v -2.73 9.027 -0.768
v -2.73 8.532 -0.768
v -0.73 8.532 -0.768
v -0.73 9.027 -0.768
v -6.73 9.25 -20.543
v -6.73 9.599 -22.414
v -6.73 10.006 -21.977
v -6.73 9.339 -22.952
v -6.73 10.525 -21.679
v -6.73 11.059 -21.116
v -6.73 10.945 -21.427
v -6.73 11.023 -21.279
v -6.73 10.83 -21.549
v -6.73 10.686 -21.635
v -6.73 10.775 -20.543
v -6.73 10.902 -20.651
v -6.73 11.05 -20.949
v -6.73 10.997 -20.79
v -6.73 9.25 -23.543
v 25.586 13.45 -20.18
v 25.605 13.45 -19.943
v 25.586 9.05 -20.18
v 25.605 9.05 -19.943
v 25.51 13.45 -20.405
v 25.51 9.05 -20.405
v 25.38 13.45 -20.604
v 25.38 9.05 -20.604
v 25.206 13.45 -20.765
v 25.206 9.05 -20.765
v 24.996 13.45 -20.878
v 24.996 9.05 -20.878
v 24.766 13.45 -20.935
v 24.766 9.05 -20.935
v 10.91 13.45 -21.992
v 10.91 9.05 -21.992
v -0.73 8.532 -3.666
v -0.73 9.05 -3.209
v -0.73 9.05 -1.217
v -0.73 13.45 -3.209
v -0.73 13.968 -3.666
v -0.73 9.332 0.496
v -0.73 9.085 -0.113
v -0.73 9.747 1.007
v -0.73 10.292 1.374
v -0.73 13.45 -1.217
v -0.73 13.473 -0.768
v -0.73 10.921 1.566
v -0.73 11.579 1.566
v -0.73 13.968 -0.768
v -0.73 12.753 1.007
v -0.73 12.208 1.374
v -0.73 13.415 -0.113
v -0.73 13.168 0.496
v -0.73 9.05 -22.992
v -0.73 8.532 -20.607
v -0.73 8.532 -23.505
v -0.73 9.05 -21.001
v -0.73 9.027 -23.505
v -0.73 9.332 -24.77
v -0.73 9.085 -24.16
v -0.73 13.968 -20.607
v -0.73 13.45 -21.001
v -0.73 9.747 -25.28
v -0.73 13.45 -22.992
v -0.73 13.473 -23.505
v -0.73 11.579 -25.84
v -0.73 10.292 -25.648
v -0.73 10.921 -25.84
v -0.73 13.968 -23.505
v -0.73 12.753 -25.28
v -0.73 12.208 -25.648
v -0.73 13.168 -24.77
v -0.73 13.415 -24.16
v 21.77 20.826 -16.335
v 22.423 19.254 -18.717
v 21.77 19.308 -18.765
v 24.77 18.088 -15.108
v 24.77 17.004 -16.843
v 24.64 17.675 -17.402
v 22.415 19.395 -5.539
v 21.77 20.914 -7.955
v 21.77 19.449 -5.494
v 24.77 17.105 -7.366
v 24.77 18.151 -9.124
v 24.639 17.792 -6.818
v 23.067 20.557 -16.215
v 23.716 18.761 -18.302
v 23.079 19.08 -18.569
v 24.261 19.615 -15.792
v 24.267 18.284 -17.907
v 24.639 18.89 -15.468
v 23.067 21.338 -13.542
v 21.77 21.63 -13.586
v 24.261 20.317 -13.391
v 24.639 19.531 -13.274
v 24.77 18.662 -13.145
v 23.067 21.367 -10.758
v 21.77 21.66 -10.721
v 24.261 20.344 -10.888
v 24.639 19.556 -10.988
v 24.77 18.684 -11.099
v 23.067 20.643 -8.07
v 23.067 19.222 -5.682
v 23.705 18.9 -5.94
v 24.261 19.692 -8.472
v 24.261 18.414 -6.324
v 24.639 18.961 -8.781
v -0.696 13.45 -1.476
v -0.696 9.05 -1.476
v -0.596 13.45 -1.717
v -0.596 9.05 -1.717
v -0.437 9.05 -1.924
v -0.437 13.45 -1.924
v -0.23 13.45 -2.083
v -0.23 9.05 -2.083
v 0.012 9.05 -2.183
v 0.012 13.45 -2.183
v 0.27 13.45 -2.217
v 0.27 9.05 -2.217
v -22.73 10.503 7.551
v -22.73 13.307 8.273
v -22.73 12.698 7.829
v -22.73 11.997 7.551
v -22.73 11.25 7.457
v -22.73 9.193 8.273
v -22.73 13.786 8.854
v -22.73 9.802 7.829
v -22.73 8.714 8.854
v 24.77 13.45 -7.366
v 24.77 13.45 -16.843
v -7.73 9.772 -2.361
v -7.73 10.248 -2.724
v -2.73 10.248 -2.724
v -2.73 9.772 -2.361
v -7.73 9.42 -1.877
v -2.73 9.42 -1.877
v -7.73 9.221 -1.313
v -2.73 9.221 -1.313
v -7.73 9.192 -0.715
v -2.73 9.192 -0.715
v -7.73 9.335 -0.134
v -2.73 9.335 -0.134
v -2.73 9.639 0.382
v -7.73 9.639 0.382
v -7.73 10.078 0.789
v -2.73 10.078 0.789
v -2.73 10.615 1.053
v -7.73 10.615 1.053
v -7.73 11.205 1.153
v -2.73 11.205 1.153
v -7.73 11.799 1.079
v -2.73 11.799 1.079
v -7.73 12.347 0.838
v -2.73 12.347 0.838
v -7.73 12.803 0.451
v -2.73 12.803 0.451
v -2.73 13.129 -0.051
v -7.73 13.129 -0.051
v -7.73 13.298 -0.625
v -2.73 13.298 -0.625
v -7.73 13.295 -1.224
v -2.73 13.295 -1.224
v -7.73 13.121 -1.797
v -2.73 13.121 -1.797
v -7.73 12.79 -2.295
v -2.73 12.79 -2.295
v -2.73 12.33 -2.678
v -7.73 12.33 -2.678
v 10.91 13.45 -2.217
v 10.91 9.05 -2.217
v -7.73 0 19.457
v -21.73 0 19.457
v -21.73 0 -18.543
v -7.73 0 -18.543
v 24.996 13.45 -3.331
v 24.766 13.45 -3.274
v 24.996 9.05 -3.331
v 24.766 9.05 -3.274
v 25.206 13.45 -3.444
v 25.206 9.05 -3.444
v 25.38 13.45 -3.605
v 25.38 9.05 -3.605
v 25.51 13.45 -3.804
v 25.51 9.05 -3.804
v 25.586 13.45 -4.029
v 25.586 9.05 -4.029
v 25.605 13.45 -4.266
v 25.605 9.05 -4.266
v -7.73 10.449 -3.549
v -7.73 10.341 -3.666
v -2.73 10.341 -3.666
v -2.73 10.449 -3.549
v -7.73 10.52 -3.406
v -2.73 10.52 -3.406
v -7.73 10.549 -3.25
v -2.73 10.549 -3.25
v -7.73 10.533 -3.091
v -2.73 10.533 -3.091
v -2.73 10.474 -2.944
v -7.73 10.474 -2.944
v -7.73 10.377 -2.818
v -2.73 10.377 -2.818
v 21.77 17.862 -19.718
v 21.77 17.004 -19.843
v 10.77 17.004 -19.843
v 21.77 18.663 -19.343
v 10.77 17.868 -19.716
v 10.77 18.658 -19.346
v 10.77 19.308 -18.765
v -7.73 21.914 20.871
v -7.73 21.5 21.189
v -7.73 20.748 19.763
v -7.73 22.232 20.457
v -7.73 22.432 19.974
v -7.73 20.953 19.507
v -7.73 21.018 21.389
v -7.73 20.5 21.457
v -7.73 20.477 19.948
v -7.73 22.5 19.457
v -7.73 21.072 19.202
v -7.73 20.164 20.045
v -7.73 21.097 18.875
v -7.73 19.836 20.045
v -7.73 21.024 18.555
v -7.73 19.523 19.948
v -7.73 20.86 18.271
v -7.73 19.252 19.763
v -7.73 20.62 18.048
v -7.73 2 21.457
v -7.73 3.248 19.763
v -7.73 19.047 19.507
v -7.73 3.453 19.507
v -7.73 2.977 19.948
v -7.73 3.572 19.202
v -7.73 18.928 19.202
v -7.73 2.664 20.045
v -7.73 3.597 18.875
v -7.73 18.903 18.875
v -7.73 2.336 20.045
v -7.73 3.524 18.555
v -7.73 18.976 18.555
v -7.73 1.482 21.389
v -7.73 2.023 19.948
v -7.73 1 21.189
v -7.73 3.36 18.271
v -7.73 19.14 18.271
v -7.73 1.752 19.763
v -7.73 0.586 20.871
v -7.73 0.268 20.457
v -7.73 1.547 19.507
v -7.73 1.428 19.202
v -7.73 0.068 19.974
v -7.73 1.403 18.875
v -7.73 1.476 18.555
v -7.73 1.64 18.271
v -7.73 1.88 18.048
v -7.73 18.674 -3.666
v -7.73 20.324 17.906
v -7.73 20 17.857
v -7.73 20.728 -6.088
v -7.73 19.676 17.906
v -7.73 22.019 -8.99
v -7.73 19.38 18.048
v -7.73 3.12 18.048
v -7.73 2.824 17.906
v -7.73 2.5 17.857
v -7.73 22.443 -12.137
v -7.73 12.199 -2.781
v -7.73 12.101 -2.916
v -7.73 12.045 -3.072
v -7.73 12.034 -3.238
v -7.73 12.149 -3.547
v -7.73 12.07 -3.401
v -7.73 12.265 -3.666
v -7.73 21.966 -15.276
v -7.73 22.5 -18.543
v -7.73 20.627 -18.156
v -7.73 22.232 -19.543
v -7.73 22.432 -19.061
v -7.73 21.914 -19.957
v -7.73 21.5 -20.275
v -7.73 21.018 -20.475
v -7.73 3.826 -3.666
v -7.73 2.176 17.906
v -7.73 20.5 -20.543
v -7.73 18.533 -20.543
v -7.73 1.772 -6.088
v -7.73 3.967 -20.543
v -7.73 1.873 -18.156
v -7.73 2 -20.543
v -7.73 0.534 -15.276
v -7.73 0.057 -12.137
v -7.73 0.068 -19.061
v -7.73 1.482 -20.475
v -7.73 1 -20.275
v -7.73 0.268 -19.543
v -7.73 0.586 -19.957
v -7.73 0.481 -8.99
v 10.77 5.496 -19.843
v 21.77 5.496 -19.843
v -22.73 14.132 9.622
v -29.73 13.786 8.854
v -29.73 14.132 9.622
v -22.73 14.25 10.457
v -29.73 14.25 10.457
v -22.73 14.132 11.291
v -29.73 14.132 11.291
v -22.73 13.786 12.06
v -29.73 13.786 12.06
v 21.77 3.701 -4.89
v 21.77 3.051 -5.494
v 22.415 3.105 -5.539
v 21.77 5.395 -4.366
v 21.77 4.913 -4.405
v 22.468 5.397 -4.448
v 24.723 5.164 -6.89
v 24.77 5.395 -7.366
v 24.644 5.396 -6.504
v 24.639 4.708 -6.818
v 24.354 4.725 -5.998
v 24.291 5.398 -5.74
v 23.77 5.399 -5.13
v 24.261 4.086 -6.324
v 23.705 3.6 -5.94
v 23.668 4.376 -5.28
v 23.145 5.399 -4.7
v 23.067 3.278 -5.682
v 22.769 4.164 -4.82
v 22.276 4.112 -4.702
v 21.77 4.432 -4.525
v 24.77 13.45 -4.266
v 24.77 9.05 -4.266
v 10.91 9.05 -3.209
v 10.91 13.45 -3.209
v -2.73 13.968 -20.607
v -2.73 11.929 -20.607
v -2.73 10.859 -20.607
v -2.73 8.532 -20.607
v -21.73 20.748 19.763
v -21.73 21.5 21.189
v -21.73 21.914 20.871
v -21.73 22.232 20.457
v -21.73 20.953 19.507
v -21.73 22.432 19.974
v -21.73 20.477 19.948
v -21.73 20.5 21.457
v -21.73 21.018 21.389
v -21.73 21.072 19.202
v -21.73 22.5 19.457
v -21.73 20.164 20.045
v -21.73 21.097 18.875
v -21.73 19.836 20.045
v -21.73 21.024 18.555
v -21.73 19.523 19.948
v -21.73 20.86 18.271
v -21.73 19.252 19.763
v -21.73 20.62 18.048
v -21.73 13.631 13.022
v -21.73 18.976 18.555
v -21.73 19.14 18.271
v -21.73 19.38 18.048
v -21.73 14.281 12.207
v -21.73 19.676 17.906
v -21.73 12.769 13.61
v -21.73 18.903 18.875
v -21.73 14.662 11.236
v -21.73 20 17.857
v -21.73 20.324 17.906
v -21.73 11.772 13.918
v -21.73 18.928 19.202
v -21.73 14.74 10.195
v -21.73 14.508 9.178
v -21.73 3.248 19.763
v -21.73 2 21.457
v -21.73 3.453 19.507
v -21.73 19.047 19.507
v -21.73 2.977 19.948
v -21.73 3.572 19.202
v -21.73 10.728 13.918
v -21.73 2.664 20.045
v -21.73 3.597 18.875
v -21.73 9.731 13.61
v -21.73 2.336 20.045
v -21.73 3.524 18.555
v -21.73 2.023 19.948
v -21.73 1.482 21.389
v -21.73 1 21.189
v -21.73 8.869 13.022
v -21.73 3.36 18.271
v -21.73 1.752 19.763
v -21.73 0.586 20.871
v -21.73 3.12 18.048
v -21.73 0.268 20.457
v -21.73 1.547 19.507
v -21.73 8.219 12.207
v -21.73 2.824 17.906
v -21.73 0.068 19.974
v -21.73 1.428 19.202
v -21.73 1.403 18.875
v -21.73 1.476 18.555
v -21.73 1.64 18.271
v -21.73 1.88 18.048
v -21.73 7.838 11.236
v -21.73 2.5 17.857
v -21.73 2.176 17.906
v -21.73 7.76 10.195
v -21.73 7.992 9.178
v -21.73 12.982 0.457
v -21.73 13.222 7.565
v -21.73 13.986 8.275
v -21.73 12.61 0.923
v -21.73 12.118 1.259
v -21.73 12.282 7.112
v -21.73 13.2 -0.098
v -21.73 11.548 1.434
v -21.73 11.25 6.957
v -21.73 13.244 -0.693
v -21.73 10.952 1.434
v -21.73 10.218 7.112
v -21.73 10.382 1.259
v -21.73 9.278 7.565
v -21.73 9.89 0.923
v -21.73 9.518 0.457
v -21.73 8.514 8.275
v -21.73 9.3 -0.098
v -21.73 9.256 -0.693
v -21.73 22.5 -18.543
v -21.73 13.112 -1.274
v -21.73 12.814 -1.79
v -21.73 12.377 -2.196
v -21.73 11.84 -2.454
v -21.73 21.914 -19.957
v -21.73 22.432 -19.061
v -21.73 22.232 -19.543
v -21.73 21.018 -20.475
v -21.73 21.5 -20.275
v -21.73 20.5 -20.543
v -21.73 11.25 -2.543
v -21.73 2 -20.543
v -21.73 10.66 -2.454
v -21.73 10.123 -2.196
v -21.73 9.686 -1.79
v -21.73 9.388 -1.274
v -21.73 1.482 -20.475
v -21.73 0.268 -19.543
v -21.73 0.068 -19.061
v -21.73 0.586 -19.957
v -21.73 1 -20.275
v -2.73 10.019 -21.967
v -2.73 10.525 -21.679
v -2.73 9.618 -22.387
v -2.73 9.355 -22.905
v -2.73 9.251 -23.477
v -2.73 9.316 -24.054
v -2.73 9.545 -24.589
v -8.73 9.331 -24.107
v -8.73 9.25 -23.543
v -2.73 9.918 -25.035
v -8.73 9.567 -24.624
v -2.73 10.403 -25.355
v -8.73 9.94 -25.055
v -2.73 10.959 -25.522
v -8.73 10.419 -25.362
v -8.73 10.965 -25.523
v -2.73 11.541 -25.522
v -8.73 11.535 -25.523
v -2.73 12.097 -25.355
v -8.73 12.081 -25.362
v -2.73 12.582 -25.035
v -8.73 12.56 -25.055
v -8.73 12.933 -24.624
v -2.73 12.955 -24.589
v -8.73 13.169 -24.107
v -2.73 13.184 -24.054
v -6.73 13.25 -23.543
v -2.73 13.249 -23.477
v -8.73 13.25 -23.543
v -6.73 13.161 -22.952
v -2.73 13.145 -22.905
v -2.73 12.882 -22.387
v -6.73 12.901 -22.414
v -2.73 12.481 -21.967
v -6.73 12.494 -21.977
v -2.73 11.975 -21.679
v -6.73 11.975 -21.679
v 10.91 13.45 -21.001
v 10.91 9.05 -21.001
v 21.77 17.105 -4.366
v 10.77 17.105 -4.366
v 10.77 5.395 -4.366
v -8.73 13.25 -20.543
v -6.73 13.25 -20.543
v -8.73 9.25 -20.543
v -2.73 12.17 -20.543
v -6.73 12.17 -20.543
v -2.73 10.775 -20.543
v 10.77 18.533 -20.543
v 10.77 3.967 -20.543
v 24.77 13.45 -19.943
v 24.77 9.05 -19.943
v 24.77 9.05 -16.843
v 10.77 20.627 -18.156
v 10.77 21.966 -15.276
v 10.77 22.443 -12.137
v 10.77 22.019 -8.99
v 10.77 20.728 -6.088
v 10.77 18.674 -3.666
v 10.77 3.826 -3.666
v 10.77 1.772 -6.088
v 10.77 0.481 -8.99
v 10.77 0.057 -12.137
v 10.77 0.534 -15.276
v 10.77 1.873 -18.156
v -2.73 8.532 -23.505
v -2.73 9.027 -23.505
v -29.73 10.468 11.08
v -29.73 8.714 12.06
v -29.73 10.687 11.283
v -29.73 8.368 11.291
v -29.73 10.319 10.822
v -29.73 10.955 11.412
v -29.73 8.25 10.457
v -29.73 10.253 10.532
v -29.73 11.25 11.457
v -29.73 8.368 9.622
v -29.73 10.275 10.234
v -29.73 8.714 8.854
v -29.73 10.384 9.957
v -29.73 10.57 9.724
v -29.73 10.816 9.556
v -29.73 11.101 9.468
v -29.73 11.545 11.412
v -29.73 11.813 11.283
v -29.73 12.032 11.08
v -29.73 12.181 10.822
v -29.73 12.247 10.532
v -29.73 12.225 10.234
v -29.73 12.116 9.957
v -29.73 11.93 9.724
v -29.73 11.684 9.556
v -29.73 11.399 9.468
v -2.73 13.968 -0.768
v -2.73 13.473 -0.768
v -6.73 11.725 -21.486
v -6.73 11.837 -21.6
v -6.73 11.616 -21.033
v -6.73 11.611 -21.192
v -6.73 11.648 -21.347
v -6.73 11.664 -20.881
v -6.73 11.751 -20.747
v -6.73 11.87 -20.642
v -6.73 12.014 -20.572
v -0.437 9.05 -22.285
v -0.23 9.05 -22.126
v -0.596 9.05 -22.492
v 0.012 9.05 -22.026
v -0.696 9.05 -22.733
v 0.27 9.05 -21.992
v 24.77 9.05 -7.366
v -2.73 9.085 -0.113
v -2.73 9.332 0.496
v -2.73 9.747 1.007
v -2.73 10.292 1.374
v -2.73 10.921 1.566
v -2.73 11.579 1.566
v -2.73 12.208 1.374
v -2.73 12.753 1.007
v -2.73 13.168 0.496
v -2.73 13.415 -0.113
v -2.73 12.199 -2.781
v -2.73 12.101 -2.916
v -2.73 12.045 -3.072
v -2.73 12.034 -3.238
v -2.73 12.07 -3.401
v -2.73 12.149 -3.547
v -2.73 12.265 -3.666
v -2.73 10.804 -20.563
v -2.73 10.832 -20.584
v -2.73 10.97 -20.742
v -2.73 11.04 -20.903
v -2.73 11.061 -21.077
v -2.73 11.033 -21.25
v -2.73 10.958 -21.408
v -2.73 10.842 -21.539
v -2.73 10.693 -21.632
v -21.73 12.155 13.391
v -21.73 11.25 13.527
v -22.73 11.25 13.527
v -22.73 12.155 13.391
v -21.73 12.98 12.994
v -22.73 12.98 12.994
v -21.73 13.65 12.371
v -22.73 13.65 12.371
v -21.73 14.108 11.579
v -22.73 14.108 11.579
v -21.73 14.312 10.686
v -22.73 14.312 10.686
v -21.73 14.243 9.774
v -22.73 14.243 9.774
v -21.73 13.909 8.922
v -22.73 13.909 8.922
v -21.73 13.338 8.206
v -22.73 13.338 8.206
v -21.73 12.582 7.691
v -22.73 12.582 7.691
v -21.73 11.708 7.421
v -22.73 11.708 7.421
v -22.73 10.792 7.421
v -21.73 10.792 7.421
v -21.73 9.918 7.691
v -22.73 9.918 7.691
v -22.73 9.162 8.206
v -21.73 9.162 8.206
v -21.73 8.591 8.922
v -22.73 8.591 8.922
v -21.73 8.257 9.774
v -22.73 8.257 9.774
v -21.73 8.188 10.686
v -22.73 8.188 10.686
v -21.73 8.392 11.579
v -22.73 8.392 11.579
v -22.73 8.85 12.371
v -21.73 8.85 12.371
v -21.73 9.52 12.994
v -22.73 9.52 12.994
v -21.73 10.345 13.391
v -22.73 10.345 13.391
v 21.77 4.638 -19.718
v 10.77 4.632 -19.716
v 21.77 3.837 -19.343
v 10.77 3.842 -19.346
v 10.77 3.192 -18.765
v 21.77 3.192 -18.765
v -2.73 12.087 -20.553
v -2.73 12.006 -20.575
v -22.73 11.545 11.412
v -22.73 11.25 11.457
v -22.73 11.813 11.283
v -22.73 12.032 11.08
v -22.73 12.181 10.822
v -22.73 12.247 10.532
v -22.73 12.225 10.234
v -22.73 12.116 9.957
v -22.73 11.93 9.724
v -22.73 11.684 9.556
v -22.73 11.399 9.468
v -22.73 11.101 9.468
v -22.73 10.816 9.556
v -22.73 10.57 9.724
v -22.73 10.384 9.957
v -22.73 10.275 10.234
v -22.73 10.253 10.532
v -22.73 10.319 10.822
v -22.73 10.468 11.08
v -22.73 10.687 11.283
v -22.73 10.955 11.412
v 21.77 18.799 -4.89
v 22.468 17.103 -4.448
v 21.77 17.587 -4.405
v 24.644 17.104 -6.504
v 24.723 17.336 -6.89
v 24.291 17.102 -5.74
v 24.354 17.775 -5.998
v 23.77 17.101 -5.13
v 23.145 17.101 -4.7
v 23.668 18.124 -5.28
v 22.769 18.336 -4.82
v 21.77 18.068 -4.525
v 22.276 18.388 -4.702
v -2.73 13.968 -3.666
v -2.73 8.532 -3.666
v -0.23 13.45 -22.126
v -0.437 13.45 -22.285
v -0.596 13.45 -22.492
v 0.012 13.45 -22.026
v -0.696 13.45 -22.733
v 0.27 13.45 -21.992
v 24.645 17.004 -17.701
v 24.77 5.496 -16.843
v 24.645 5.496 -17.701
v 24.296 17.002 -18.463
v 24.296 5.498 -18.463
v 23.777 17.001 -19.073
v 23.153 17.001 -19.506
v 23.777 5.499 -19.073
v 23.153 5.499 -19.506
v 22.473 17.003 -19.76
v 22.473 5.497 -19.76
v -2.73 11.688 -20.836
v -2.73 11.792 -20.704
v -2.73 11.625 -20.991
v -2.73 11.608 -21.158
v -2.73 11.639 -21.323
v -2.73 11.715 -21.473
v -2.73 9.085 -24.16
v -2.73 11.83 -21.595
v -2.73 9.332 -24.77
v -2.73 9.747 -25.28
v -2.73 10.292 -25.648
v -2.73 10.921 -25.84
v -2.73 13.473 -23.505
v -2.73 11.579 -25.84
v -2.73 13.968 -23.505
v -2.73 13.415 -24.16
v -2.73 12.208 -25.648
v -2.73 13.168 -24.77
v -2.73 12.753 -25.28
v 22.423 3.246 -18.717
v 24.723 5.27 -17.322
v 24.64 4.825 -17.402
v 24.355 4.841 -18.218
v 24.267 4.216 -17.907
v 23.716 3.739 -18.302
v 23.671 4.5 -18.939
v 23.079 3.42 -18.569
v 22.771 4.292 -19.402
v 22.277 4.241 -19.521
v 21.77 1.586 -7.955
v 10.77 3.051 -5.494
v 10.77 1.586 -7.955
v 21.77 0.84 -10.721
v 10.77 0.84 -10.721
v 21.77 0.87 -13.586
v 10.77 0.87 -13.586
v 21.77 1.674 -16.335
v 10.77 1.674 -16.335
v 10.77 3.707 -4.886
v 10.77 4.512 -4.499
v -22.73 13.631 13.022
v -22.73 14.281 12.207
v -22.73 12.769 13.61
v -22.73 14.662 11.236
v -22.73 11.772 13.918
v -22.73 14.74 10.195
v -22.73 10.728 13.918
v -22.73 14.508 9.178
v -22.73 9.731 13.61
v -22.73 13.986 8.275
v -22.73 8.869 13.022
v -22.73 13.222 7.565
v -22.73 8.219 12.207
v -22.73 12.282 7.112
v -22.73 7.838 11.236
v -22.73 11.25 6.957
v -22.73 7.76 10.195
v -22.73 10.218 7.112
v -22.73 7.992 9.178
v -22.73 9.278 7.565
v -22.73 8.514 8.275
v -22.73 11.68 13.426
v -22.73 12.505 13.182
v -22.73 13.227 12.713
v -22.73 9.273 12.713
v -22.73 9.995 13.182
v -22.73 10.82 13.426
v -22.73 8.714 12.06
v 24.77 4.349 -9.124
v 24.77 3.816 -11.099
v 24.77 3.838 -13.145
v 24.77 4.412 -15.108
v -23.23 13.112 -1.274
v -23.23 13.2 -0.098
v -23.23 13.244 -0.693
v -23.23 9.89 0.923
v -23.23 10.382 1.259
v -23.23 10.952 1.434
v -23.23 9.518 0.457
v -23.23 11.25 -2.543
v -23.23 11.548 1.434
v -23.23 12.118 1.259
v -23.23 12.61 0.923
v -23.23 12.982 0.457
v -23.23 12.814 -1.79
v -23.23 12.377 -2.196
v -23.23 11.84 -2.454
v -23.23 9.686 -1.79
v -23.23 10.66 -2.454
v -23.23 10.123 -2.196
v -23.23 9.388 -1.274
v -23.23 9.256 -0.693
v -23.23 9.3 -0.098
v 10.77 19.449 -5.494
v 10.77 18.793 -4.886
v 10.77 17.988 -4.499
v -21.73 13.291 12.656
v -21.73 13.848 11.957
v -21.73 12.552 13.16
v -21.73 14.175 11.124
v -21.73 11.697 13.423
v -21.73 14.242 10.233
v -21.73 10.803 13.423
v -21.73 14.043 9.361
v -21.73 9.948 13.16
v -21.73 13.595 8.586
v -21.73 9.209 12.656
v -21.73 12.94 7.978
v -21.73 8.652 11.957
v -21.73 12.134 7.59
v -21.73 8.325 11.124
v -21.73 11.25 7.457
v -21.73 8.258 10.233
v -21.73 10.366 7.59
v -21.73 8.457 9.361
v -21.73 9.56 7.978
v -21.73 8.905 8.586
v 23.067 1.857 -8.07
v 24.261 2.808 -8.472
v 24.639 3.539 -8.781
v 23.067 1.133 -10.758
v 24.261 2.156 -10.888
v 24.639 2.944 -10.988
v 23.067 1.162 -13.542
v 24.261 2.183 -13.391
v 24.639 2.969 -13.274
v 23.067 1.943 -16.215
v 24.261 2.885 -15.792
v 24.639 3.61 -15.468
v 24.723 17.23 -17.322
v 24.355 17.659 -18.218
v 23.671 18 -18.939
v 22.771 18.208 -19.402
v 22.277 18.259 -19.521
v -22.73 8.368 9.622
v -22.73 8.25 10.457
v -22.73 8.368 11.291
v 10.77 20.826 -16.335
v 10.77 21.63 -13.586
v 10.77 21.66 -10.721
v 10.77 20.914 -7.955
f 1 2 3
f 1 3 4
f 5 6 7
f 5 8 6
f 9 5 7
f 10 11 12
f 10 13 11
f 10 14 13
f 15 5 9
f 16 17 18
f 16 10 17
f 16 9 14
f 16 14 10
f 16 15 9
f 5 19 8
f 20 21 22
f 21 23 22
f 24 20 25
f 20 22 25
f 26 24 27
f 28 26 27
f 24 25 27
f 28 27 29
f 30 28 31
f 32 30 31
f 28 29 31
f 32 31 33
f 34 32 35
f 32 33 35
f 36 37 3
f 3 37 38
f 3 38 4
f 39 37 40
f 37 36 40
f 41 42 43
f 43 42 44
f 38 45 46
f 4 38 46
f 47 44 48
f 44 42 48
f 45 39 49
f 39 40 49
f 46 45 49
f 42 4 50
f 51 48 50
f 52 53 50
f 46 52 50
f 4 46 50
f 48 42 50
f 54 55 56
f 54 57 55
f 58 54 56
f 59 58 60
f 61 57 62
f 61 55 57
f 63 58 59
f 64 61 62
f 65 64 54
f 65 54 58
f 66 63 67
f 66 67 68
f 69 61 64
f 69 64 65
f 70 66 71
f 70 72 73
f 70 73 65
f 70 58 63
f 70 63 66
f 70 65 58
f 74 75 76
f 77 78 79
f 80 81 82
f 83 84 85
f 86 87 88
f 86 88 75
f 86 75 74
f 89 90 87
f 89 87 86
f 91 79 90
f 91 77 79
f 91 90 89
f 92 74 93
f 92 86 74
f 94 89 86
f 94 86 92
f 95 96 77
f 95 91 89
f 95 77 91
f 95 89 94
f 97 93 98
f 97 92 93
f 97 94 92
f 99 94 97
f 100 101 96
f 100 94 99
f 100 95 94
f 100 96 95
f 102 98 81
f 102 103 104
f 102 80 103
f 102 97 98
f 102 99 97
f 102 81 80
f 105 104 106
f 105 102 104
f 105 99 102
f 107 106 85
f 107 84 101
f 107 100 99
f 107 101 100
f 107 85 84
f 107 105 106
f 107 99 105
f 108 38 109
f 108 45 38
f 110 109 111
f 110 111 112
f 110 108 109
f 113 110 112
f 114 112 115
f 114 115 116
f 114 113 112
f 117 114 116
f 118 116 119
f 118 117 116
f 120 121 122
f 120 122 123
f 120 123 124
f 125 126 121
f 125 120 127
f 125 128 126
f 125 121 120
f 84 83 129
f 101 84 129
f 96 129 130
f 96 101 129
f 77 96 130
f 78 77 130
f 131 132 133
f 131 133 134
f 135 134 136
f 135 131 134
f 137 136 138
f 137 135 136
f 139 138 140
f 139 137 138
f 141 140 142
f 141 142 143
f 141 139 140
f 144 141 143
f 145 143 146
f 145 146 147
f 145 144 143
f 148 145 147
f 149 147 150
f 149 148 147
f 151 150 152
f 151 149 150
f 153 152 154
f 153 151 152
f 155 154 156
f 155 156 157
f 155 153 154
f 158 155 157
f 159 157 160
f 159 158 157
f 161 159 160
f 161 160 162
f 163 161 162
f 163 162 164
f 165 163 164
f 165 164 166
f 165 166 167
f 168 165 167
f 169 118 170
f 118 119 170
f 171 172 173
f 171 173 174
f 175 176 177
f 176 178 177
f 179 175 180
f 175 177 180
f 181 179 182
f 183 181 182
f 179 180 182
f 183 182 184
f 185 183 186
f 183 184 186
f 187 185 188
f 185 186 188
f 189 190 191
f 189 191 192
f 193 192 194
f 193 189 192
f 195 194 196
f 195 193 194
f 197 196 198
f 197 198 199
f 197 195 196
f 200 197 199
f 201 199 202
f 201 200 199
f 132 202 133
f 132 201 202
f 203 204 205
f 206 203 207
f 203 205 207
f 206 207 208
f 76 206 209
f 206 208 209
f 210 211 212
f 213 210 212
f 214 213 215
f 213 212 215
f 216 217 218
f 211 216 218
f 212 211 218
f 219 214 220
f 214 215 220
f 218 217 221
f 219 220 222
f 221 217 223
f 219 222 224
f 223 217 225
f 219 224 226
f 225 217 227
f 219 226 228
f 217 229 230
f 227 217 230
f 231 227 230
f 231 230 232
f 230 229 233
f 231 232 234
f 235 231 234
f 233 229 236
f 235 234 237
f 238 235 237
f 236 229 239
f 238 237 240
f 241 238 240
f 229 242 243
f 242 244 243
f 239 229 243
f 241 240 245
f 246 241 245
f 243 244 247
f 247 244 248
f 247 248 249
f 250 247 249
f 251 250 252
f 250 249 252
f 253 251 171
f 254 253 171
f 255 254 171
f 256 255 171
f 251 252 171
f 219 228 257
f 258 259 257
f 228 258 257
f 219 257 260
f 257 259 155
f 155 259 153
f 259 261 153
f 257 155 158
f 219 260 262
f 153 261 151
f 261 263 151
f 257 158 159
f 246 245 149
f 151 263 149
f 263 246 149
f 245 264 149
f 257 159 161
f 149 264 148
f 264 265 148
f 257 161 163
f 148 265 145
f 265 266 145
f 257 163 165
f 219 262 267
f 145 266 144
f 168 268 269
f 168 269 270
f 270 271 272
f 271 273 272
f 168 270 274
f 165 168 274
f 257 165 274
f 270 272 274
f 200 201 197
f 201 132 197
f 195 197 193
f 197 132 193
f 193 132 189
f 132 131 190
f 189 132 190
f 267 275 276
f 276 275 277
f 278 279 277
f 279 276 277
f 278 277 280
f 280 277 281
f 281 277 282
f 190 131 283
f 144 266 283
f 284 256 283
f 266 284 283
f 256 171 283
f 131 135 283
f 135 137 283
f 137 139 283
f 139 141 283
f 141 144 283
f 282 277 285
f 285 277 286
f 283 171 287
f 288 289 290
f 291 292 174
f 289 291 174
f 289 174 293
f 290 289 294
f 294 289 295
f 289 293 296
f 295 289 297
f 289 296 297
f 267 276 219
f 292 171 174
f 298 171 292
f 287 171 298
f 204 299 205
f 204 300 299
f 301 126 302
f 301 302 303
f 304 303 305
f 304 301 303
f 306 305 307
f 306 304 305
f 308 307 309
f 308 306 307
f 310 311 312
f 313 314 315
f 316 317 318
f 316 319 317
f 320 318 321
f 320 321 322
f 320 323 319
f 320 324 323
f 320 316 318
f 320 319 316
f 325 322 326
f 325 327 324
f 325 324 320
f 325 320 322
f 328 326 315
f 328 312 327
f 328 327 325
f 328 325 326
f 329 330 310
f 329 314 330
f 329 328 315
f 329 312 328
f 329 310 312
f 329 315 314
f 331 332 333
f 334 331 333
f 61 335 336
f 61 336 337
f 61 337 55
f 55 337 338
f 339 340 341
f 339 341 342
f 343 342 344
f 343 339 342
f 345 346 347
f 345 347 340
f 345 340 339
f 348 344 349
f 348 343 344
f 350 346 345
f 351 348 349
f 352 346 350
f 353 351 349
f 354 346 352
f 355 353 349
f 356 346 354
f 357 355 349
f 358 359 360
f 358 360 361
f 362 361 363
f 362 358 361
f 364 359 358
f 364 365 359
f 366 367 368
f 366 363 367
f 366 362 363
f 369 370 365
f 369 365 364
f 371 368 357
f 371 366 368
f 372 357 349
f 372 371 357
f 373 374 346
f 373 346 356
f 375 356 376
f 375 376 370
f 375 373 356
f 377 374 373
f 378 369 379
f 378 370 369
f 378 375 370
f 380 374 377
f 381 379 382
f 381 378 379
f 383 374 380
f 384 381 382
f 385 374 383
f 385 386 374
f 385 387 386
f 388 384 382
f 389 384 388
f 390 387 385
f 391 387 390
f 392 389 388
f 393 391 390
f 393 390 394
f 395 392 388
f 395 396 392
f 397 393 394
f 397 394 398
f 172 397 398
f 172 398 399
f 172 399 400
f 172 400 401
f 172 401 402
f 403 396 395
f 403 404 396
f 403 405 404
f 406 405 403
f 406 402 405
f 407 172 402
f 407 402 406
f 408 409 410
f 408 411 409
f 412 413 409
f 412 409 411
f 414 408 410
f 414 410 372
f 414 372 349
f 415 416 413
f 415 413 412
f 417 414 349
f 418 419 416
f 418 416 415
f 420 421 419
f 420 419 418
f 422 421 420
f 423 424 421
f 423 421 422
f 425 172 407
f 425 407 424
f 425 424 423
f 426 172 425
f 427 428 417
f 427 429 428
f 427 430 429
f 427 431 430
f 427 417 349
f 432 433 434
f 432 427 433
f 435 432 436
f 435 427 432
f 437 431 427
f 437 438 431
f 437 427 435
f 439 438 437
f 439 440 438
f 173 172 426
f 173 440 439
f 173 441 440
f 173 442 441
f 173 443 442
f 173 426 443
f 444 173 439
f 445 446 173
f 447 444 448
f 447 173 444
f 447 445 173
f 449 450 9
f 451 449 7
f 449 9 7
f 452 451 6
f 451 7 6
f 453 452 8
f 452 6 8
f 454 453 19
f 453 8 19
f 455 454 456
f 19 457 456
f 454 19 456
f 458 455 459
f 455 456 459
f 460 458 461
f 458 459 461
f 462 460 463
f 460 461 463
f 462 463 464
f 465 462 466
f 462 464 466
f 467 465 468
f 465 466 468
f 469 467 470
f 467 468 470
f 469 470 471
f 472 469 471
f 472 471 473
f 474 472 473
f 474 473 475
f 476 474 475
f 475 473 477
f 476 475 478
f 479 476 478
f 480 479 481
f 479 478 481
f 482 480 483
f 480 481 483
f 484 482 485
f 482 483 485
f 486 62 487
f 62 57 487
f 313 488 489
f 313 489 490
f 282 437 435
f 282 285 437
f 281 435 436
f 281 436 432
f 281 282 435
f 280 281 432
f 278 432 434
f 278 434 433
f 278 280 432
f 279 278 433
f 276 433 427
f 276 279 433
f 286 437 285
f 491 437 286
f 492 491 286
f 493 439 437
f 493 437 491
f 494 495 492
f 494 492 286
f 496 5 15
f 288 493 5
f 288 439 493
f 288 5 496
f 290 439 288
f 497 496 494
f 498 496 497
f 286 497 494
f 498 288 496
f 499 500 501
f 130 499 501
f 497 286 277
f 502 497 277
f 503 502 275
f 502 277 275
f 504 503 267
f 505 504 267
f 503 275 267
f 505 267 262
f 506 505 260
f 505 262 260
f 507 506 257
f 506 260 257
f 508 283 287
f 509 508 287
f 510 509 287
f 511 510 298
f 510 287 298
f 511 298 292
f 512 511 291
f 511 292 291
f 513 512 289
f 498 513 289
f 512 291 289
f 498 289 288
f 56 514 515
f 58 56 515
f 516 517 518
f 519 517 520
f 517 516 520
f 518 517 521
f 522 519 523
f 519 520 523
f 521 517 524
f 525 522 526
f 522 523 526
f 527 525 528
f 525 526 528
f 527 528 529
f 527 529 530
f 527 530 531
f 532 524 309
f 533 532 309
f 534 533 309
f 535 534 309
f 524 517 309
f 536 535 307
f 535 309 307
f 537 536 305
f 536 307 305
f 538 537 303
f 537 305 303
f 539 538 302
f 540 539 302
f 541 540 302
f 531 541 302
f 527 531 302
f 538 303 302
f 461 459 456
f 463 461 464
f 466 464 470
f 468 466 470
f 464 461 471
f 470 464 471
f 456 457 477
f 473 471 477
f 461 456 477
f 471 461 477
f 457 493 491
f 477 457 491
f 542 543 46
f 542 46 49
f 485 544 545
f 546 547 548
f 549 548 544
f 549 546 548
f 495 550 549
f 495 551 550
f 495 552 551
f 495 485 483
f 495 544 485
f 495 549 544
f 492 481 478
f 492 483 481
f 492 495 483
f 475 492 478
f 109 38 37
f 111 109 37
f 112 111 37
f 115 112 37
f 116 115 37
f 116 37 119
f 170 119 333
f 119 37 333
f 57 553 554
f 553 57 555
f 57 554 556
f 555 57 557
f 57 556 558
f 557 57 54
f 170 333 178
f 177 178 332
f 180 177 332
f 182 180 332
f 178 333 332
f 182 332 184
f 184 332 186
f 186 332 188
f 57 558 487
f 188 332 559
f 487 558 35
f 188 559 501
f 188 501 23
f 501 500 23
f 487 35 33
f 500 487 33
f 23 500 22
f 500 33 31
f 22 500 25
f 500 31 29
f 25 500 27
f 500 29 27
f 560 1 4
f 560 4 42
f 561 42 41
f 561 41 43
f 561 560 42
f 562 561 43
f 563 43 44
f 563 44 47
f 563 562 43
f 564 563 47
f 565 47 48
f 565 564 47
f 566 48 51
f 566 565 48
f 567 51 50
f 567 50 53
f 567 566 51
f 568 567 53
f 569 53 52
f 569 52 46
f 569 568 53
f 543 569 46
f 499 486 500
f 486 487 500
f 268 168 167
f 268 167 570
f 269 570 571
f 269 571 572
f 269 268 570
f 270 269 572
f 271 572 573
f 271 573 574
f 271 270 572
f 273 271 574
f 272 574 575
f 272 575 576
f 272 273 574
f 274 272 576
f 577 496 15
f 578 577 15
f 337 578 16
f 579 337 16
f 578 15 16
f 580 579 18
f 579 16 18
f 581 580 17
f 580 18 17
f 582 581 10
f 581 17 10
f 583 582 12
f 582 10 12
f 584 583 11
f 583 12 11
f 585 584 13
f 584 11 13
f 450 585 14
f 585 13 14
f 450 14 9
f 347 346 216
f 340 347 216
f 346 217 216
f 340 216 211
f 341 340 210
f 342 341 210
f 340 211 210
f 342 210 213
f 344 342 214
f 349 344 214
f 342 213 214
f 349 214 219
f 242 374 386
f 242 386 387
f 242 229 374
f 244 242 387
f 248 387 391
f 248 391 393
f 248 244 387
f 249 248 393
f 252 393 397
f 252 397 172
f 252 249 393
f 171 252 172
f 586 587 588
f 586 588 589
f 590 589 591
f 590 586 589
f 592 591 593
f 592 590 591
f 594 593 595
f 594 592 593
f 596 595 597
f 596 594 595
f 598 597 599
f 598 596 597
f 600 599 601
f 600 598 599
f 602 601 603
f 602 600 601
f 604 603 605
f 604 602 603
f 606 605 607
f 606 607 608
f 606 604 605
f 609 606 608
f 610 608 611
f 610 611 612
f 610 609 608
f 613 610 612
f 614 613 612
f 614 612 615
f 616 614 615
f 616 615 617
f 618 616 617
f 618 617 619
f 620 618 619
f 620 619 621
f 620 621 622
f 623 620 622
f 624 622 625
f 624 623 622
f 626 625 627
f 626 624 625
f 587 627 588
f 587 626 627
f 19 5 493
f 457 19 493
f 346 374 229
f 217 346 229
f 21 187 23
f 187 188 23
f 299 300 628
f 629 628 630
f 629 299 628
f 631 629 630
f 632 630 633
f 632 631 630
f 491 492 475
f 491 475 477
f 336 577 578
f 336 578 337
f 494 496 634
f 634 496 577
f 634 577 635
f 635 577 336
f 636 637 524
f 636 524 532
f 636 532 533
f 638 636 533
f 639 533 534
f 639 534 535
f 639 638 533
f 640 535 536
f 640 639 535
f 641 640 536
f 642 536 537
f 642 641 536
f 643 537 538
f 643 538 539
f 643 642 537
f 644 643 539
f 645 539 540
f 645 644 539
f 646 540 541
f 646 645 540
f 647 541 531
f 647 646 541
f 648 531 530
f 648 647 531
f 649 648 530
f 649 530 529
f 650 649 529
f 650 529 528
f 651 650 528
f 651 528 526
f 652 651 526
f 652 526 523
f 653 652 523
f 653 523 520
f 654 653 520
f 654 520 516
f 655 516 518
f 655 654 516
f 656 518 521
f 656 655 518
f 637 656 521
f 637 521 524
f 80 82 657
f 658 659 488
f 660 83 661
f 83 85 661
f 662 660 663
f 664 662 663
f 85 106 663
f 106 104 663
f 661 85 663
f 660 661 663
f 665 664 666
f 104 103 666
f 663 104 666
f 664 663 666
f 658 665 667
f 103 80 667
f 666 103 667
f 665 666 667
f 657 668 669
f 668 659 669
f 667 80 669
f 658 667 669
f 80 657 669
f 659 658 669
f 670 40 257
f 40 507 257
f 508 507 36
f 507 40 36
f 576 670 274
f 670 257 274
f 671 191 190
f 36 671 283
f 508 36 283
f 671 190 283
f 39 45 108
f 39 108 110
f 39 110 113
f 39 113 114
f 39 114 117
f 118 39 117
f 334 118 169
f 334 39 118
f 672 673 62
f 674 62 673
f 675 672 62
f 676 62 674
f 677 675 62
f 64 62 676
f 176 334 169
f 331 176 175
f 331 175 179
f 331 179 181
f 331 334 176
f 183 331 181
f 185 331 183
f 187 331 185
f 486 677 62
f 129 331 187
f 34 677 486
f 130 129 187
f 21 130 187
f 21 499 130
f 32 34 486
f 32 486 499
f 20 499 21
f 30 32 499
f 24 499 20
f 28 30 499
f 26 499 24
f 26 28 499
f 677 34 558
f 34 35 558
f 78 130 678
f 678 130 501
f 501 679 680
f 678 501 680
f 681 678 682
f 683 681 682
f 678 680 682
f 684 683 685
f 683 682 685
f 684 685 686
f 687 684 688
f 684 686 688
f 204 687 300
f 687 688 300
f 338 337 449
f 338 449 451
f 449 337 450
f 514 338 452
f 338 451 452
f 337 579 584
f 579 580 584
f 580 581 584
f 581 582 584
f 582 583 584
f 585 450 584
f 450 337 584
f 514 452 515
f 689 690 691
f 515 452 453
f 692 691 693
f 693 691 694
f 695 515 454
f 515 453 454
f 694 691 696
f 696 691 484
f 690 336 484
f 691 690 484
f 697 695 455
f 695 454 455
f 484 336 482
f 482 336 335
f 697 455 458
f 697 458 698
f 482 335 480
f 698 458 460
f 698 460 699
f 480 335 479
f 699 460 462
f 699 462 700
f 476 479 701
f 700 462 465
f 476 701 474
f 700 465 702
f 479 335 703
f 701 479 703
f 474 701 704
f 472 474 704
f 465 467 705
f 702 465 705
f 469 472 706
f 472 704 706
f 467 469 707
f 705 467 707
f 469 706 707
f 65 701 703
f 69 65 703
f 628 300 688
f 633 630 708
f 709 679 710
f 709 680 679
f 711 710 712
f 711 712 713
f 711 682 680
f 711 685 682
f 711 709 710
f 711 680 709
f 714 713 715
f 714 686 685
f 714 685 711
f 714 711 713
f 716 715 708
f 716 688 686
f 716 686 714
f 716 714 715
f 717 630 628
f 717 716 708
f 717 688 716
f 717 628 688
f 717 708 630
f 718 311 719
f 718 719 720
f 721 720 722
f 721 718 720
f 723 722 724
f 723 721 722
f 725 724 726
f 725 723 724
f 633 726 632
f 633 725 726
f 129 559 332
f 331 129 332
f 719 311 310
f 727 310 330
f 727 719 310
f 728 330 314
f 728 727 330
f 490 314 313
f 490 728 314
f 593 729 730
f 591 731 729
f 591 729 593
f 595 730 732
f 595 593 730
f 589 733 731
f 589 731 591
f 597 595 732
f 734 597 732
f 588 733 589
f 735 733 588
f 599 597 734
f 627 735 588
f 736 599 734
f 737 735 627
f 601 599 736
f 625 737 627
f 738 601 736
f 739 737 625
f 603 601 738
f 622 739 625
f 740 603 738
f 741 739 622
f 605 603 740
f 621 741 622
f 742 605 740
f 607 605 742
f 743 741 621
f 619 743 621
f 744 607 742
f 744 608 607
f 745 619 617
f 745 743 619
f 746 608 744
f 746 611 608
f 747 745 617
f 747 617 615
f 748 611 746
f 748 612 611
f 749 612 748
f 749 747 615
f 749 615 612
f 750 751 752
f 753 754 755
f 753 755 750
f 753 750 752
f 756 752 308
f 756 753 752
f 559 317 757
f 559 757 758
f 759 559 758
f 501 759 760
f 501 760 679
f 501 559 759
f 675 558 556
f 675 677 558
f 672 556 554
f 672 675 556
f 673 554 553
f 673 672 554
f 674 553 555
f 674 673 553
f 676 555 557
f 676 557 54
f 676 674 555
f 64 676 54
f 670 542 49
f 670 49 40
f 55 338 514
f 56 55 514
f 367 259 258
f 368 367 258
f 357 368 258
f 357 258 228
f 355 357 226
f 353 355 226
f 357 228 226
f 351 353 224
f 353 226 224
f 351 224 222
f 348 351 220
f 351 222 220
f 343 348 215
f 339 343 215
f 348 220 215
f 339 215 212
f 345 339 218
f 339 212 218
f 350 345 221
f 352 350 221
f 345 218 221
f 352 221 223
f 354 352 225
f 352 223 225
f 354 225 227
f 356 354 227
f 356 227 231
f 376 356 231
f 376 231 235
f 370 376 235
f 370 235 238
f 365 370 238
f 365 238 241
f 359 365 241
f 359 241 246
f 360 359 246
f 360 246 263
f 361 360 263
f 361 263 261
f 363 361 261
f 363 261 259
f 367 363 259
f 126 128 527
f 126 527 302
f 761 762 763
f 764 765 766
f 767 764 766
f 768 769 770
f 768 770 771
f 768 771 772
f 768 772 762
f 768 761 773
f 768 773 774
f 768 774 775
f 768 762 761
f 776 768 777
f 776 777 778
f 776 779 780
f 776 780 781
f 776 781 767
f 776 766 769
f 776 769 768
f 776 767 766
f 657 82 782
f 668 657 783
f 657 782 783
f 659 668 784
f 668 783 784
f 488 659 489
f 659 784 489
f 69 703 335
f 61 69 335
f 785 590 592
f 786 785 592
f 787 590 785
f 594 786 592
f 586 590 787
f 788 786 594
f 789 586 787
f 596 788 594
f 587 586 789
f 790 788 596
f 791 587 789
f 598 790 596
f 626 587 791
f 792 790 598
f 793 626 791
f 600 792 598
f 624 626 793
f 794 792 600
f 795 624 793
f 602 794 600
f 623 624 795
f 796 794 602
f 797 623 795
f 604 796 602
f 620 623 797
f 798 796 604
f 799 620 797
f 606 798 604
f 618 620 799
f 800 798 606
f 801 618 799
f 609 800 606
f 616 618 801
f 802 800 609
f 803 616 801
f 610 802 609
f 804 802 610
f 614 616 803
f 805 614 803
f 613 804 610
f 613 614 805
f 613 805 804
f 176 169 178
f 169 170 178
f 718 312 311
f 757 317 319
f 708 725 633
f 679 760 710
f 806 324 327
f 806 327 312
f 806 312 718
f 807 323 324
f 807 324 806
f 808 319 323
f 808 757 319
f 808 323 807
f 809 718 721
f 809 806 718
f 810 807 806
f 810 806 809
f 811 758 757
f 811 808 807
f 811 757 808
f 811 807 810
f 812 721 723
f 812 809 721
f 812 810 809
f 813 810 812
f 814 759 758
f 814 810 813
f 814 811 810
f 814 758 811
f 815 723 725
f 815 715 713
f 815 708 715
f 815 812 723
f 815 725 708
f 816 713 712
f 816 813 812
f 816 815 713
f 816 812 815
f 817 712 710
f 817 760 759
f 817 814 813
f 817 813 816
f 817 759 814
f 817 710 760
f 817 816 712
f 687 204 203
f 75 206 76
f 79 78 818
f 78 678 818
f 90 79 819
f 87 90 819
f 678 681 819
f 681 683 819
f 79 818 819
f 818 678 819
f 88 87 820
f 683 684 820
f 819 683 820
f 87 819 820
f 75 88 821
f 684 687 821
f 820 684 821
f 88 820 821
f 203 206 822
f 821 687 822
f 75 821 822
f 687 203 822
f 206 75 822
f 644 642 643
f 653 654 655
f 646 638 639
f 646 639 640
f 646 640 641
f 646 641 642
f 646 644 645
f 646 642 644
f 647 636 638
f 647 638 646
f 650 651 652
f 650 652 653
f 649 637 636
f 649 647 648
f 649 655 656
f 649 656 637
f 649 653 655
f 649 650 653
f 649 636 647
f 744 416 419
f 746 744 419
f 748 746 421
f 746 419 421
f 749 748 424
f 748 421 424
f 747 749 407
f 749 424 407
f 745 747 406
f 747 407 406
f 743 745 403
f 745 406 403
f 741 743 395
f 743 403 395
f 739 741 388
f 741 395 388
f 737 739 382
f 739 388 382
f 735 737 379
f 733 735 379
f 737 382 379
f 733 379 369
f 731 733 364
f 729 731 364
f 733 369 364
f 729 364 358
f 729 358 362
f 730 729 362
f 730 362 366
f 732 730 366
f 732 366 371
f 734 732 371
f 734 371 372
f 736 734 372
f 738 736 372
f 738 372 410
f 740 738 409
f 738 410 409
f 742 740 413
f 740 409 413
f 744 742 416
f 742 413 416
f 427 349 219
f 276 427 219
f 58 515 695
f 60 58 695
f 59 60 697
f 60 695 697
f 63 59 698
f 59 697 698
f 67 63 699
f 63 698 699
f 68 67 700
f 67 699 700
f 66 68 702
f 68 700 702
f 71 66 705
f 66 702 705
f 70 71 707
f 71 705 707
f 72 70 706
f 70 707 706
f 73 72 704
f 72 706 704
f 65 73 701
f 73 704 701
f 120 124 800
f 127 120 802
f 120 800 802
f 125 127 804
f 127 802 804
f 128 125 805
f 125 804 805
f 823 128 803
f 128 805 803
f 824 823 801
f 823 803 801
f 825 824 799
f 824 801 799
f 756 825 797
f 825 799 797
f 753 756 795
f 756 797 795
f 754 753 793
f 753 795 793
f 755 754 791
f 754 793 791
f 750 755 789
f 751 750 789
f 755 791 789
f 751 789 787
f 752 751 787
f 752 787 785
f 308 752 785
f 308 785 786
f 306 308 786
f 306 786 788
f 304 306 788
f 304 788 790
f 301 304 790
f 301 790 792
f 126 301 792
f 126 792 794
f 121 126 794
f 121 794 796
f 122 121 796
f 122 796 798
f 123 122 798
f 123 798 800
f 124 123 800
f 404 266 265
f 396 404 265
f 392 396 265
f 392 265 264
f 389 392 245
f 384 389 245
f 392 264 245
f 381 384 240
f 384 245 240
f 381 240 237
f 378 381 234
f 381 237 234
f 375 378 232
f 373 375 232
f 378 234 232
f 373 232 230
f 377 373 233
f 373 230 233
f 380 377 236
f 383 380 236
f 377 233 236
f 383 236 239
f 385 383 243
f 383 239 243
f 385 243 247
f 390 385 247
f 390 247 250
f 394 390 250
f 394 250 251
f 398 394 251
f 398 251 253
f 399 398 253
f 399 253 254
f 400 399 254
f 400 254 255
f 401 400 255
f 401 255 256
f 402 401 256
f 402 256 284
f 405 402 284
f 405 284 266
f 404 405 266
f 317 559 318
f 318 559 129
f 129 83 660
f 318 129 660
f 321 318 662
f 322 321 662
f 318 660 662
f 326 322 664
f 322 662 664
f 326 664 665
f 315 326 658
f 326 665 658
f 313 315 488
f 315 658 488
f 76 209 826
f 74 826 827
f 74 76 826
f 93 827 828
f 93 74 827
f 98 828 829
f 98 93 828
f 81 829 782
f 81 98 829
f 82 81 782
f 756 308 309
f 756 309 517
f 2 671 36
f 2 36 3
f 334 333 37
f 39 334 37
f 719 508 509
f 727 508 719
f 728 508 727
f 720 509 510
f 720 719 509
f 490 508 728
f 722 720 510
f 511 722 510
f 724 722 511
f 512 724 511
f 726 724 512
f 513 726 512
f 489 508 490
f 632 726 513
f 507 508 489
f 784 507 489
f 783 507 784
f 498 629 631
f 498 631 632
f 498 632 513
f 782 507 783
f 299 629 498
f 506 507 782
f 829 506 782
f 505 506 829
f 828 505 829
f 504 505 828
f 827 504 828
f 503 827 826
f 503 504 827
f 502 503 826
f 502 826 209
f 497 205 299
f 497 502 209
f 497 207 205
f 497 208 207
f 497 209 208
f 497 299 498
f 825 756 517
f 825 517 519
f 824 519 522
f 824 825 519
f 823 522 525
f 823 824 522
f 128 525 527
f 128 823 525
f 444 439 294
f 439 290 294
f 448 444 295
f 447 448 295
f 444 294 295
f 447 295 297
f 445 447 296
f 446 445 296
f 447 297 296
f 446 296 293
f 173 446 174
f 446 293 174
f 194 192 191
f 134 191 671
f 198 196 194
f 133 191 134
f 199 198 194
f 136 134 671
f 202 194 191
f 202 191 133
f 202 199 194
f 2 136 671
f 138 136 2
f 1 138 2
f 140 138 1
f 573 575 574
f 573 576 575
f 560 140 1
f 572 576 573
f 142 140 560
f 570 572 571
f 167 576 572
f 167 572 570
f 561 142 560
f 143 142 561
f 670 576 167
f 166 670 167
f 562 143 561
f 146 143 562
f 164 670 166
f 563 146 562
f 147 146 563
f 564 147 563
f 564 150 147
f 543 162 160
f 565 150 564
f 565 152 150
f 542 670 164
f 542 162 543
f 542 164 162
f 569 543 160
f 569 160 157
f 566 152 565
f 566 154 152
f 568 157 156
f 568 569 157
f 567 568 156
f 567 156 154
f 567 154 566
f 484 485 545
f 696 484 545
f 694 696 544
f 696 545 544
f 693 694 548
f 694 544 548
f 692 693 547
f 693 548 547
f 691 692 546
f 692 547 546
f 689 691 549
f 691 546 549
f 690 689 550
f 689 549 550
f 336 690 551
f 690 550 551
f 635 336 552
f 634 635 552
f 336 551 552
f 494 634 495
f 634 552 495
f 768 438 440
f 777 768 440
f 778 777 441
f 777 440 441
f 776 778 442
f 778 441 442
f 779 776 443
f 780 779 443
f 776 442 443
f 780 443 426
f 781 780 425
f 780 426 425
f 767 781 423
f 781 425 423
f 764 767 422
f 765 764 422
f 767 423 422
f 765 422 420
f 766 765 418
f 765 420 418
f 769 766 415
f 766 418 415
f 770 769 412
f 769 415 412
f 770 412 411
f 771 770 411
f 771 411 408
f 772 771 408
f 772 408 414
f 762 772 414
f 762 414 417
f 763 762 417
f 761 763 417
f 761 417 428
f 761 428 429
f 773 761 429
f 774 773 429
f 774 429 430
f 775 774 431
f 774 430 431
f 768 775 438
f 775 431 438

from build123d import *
from build123d.topology import SkipClean

# Parameters (mm, degrees)
SKETCH1_W            = 14
SKETCH1_H            = 42
BOSS_EXTRUDE1_DEPTH  = 22.5
FILLET1_R            = 2
BOSS_EXTRUDE2_DEPTH  = 18.5
BOSS_EXTRUDE3_DEPTH  = 5
SKETCH4_R            = 1.1
CUT_EXTRUDE1_DEPTH   = 15
SKETCH5_W            = 2
SKETCH5_H            = 4
BOSS_EXTRUDE4_DEPTH  = 5
BOSS_EXTRUDE5_DEPTH  = 4
CUT_EXTRUDE2_START   = -2
CUT_EXTRUDE2_DEPTH   = 2
SKETCH12_R           = 3.5
SKETCH12_R_2         = 3.070336519
BOSS_EXTRUDE6_DEPTH  = 1
SKETCH14_R           = 3
BOSS_EXTRUDE7_DEPTH  = 1
SKETCH15_R           = 1
BOSS_EXTRUDE8_DEPTH  = 7
SKETCH16_R           = 2
BOSS_EXTRUDE9_DEPTH  = 1.5
CUT_EXTRUDE3_DEPTH   = 18.5
BOSS_EXTRUDE10_START = 32.5
BOSS_EXTRUDE10_DEPTH = 32.5
FILLET2_R            = 3
FILLET3_R            = 3
BOSS_EXTRUDE11_DEPTH = 2
BOSS_EXTRUDE12_DEPTH = 2.2
FILLET4_R            = 1


with BuildPart() as part:
    # Sketch1 → Boss-Extrude1 (new body)
    with BuildSketch(Plane(origin=(0, 0, 0), x_dir=(1, 0, 0), z_dir=(0, 1, 0))):
        with Locations((-14.72963025, -0.456790856)):
            Rectangle(SKETCH1_W, SKETCH1_H)
    extrude(amount=BOSS_EXTRUDE1_DEPTH)

    # Fillet1
    fillet1_edges = [part.edges().sort_by_distance(p)[0] for p in [
        (-14.72963025, 22.5, -20.543209144),
        (-14.72963025, 0, -20.543209144),
        (-14.72963025, 0, 21.456790856),
        (-14.72963025, 22.5, 21.456790856),
    ]]
    fillet(fillet1_edges, radius=FILLET1_R)

    # Sketch2 → Boss-Extrude2 (add)
    with BuildSketch(Plane(origin=(-7.72963025, 0, 0), x_dir=(0, 0, -1), z_dir=(1, 0, 0))):
        with BuildLine():
            Line((3.666133326, 18.67433994), (3.666133326, 3.82566006))
            ThreePointArc((3.666133326, 3.82566006), (12.136760187, 0.056811401), (20.543209144, 3.966716207))
            Line((20.543209144, 3.966716207), (20.543209144, 18.533283793))
            ThreePointArc((20.543209144, 18.533283793), (12.136760187, 22.443188599), (3.666133326, 18.67433994))
        make_face()
    extrude(amount=BOSS_EXTRUDE2_DEPTH)

    # Sketch3 → Boss-Extrude3 (add)
    with BuildSketch(Plane(origin=(-7.72963025, 0, 0), x_dir=(0, 0, -1), z_dir=(1, 0, 0))):
        with BuildLine():
            Line((3.666133326, 12.265446457), (3.666133326, 10.341158941))
            ThreePointArc((3.666133326, 10.341158941), (3.170141933, 10.546427574), (2.72390333, 10.248075799))
            ThreePointArc((2.72390333, 10.248075799), (-1.152649836, 11.204898318), (2.678489822, 12.329861741))
            ThreePointArc((2.678489822, 12.329861741), (3.155102255, 12.033793242), (3.666133326, 12.265446457))
        make_face()
    extrude(amount=BOSS_EXTRUDE3_DEPTH)

    # Sketch4 → Cut-Extrude1 (cut)
    with BuildSketch(Plane(origin=(-7.72963025, 0, 0), x_dir=(0, 0, -1), z_dir=(1, 0, 0))):
        with Locations((-18.956790856, 20)):
            Circle(SKETCH4_R)
        with Locations((-18.956790856, 2.5)):
            Circle(SKETCH4_R)
    extrude(amount=-CUT_EXTRUDE1_DEPTH, mode=Mode.SUBTRACT)

    # Sketch5 → Boss-Extrude4 (add)
    with BuildSketch(Plane(origin=(0, 0, -20.543209144), x_dir=(-1, 0, 0), z_dir=(0, 0, -1))):
        with Locations((7.72963025, 11.25)):
            Rectangle(SKETCH5_W, SKETCH5_H)
    extrude(amount=BOSS_EXTRUDE4_DEPTH)

    # Sketch6 → Boss-Extrude5 (add)
    with BuildSketch(Plane(origin=(-6.72963025, 0, 0), x_dir=(0, 0, -1), z_dir=(1, 0, 0))):
        with BuildLine():
            ThreePointArc((21.679339079, 11.975250565), (21.032871281, 11.616126027), (20.543209144, 12.17031195))
            Line((20.543209144, 12.17031195), (20.543209144, 10.774749435))
            ThreePointArc((20.543209144, 10.774749435), (21.198638933, 11.046780591), (21.679339079, 10.524749435))
            ThreePointArc((21.679339079, 10.524749435), (25.543209144, 11.25), (21.679339079, 11.975250565))
        make_face()
    extrude(amount=BOSS_EXTRUDE5_DEPTH)

    # Sketch7 → Cut-Extrude2 (cut)
    with BuildSketch(Plane(origin=(-6.72963025, 0, 0), x_dir=(0, 0, -1), z_dir=(1, 0, 0)).offset(CUT_EXTRUDE2_START)):
        with BuildLine():
            Line((23.543209144, 13.25), (23.543209144, 13.967200788))
            Line((23.543209144, 13.967200788), (25.760178749, 13.967200788))
            Line((25.760178749, 13.967200788), (25.760178749, 8.970470958))
            Line((25.760178749, 8.970470958), (23.543209144, 8.970470958))
            Line((23.543209144, 8.970470958), (23.543209144, 9.25))
            ThreePointArc((23.543209144, 9.25), (25.543209144, 11.25), (23.543209144, 13.25))
        make_face()
    extrude(amount=CUT_EXTRUDE2_DEPTH, mode=Mode.SUBTRACT)

    # Sketch12 → Boss-Extrude6 (add)
    with BuildSketch(Plane.ZY.offset(21.72963025)):
        with Locations(Location((10.456790856, 11.25, 0), (0, 0, 180))):
            Circle(SKETCH12_R)
        with Locations((10.456790856, 11.25)):
            Circle(SKETCH12_R_2, mode=Mode.SUBTRACT)
    extrude(amount=BOSS_EXTRUDE6_DEPTH)

    # Sketch14 → Boss-Extrude7 (add)
    with BuildSketch(Plane.ZY.offset(21.72963025)):
        with Locations(Location((10.456790856, 11.25, 0), (0, 0, 180))):
            Circle(SKETCH14_R)
    extrude(amount=BOSS_EXTRUDE7_DEPTH)

    # Sketch15 → Boss-Extrude8 (add)
    with SkipClean():  # the faces are left unmerged after this step: merging them gives an invalid solid
        with BuildSketch(Plane.ZY.offset(22.72963025)):
            with BuildLine():
                Line((8.853884636, 8.714119157), (8.853884636, 13.785880843))
                ThreePointArc((8.853884636, 13.785880843), (10.456790856, 14.25), (12.059697077, 13.785880843))
                Line((12.059697077, 13.785880843), (12.059697077, 8.714119157))
                ThreePointArc((12.059697077, 8.714119157), (10.456790856, 8.25), (8.853884636, 8.714119157))
            make_face()
            with Locations((10.456790856, 11.25)):
                Circle(SKETCH15_R, mode=Mode.SUBTRACT)
        extrude(amount=BOSS_EXTRUDE8_DEPTH)

    # Sketch16 → Boss-Extrude9 (add)
    with SkipClean():  # the faces are left unmerged after this step: merging them gives an invalid solid
        with BuildSketch(Plane.ZY.offset(21.72963025)):
            with Locations(Location((-0.543209144, 11.25, 0), (0, 0, 180))):
                Circle(SKETCH16_R)
        extrude(amount=BOSS_EXTRUDE9_DEPTH)

    # Sketch17 → Cut-Extrude3 (cut)
    with SkipClean():  # the faces are left unmerged after this step: merging them gives an invalid solid
        with BuildSketch(Plane(origin=(10.77036975, 0, 0), x_dir=(0, 0, -1), z_dir=(1, 0, 0))):
            with BuildLine():
                Line((19.843209144, 4.230369564), (19.843209144, 18.269630436))
                ThreePointArc((19.843209144, 18.269630436), (12.134214683, 21.743184905), (4.366133326, 18.403860381))
                Line((4.366133326, 18.403860381), (4.366133326, 4.096139619))
                ThreePointArc((4.366133326, 4.096139619), (12.134214683, 0.756815095), (19.843209144, 4.230369564))
            make_face()
        extrude(amount=-CUT_EXTRUDE3_DEPTH, mode=Mode.SUBTRACT)

    # Sketch18 → Boss-Extrude10 (add)
    with SkipClean():  # the faces are left unmerged after this step: merging them gives an invalid solid
        with BuildSketch(Plane(origin=(-7.72963025, 0, 0), x_dir=(0, 0, -1), z_dir=(1, 0, 0)).offset(BOSS_EXTRUDE10_START)):
            with BuildLine():
                Line((19.843209144, 4.230369564), (19.843209144, 18.269630436))
                ThreePointArc((19.843209144, 18.269630436), (12.134214683, 21.743184905), (4.366133326, 18.403860381))
                Line((4.366133326, 18.403860381), (4.366133326, 4.096139619))
                ThreePointArc((4.366133326, 4.096139619), (12.134214683, 0.756815095), (19.843209144, 4.230369564))
            make_face()
        extrude(amount=-BOSS_EXTRUDE10_DEPTH)

    # Fillet2
    # the kernel refuses this fillet: 3 mm, written as the material it takes off along each edge
    with BuildSketch(Plane(origin=(24.77036975, 11.25, -12.043209144), x_dir=(0, -0.03508404520009265, 0.9993843653832083), z_dir=(0, 0.9993843653832083, 0.03508404520009265))) as fillet2_piece_1:
        with BuildLine():
            CenterArc((10.493579535 - FILLET2_R, -FILLET2_R), FILLET2_R, 0, 90)
            Line((10.493579535 - FILLET2_R, 0), (10.493579535, 0))
            Line((10.493579535, 0), (10.493579535, -FILLET2_R))
        make_face()
    revolve(axis=Axis((24.77036975, 11.25, -12.043209144), (1, 0, 0)), revolution_arc=176.972646772, mode=Mode.SUBTRACT)
    with BuildSketch(Plane(origin=(24.77036975, -3.269630436, -19.843209144), x_dir=(-1, 0, 0), z_dir=(0, 1, 0))) as fillet2_piece_2:
        with BuildLine():
            CenterArc((FILLET2_R, FILLET2_R), FILLET2_R, 180, 90)
            Line((0, FILLET2_R), (0, 0))
            Line((0, 0), (FILLET2_R, 0))
        make_face()
    extrude(amount=29.039260873, mode=Mode.SUBTRACT)
    with BuildSketch(Plane(origin=(24.77036975, 11.25, -12.043209144), x_dir=(0, 0.017745103398297987, -0.9998425432563788), z_dir=(0, -0.9998425432563788, -0.017745103398297987))) as fillet2_piece_3:
        with BuildLine():
            CenterArc((10.493579535 - FILLET2_R, -FILLET2_R), FILLET2_R, 0, 90)
            Line((10.493579535 - FILLET2_R, 0), (10.493579535, 0))
            Line((10.493579535, 0), (10.493579535, -FILLET2_R))
        make_face()
    revolve(axis=Axis((24.77036975, 11.25, -12.043209144), (1, 0, 0)), revolution_arc=176.972646772, mode=Mode.SUBTRACT)
    with BuildSketch(Plane(origin=(24.77036975, 25.903860381, -4.366133326), x_dir=(-1, 0, 0), z_dir=(0, -1, 0))) as fillet2_piece_4:
        with BuildLine():
            CenterArc((FILLET2_R, FILLET2_R), FILLET2_R, 180, 90)
            Line((0, FILLET2_R), (0, 0))
            Line((0, 0), (FILLET2_R, 0))
        make_face()
    extrude(amount=29.307720762, mode=Mode.SUBTRACT)

    # Fillet3
    fillet3_edges = [part.edges().sort_by_distance(p)[0] for p in [
        (16.27036975, 4.096139619, -4.366133326),
        (16.27036975, 18.403860381, -4.366133326),
        (16.27036975, 18.269630436, -19.843209144),
        (16.27036975, 4.230369564, -19.843209144),
        (23.939626378, 17.904127425, -18.915484598),
        (23.939626378, 4.595872575, -18.915484598),
        (23.942018914, 18.027736711, -5.296365269),
        (23.942018914, 4.472263289, -5.296365269),
    ]]
    fillet(fillet3_edges, radius=FILLET3_R)

    # Sketch19 → Boss-Extrude11 (add)
    with BuildSketch(Plane(origin=(-2.72963025, 0, 0), x_dir=(0, 0, -1), z_dir=(1, 0, 0))):
        with BuildLine():
            Line((0.768030026, 13.473431353), (0.768030026, 13.968221025))
            Line((0.768030026, 13.968221025), (3.666133326, 13.968221025))
            Line((3.666133326, 13.968221025), (3.666133326, 8.531778975))
            Line((3.666133326, 8.531778975), (0.768030026, 8.531778975))
            Line((0.768030026, 8.531778975), (0.768030026, 9.026568647))
            ThreePointArc((0.768030026, 9.026568647), (-1.590616444, 11.25), (0.768030026, 13.473431353))
        make_face()
        with BuildLine():
            Line((23.505490349, 8.531778975), (23.505490349, 9.026568647))
            ThreePointArc((23.505490349, 9.026568647), (25.864136819, 11.25), (23.505490349, 13.473431353))
            Line((23.505490349, 13.473431353), (23.505490349, 13.968221025))
            Line((23.505490349, 13.968221025), (20.607387049, 13.968221025))
            Line((20.607387049, 13.968221025), (20.607387049, 8.531778975))
            Line((20.607387049, 8.531778975), (23.505490349, 8.531778975))
        make_face()
    extrude(amount=BOSS_EXTRUDE11_DEPTH)

    # Sketch22 → Boss-Extrude12 (add, symmetric)
    with BuildSketch(Plane(origin=(0, 11.25, 0), x_dir=(-1, 0, 0), z_dir=(0, -1, 0))):
        with BuildLine():
            Line((0.72963025, 3.208547986), (0.72963025, 2.217081676))
            Line((0.72963025, 2.217081676), (-10.91025311, 2.217081676))
            Line((-10.91025311, 2.217081676), (-24.765511007, 3.274279543))
            ThreePointArc((-24.765511007, 3.274279543), (-25.380466801, 3.60490992), (-25.6047274, 4.26611659))
            Line((-25.6047274, 4.26611659), (-25.6047274, 19.94322588))
            ThreePointArc((-25.6047274, 19.94322588), (-25.380466801, 20.604432549), (-24.765511007, 20.935062926))
            Line((-24.765511007, 20.935062926), (-10.91025311, 21.992260794))
            Line((-10.91025311, 21.992260794), (0.72963025, 21.992260794))
            Line((0.72963025, 21.992260794), (0.72963025, 21.000794484))
            Line((0.72963025, 21.000794484), (-10.91025311, 21.000794484))
            Line((-10.91025311, 21.000794484), (-24.77036975, 19.94322588))
            Line((-24.77036975, 19.94322588), (-24.77036975, 4.26611659))
            Line((-24.77036975, 4.26611659), (-10.91025311, 3.208547986))
            Line((-10.91025311, 3.208547986), (0.72963025, 3.208547986))
        make_face()
    extrude(amount=BOSS_EXTRUDE12_DEPTH, both=True)

    # Fillet4
    fillet4_edges = [part.edges().sort_by_distance(p)[0] for p in [
        (-0.72963025, 11.25, -21.992260794),
        (-0.72963025, 11.25, -2.217081676),
    ]]
    fillet(fillet4_edges, radius=FILLET4_R)


solid = part.part
